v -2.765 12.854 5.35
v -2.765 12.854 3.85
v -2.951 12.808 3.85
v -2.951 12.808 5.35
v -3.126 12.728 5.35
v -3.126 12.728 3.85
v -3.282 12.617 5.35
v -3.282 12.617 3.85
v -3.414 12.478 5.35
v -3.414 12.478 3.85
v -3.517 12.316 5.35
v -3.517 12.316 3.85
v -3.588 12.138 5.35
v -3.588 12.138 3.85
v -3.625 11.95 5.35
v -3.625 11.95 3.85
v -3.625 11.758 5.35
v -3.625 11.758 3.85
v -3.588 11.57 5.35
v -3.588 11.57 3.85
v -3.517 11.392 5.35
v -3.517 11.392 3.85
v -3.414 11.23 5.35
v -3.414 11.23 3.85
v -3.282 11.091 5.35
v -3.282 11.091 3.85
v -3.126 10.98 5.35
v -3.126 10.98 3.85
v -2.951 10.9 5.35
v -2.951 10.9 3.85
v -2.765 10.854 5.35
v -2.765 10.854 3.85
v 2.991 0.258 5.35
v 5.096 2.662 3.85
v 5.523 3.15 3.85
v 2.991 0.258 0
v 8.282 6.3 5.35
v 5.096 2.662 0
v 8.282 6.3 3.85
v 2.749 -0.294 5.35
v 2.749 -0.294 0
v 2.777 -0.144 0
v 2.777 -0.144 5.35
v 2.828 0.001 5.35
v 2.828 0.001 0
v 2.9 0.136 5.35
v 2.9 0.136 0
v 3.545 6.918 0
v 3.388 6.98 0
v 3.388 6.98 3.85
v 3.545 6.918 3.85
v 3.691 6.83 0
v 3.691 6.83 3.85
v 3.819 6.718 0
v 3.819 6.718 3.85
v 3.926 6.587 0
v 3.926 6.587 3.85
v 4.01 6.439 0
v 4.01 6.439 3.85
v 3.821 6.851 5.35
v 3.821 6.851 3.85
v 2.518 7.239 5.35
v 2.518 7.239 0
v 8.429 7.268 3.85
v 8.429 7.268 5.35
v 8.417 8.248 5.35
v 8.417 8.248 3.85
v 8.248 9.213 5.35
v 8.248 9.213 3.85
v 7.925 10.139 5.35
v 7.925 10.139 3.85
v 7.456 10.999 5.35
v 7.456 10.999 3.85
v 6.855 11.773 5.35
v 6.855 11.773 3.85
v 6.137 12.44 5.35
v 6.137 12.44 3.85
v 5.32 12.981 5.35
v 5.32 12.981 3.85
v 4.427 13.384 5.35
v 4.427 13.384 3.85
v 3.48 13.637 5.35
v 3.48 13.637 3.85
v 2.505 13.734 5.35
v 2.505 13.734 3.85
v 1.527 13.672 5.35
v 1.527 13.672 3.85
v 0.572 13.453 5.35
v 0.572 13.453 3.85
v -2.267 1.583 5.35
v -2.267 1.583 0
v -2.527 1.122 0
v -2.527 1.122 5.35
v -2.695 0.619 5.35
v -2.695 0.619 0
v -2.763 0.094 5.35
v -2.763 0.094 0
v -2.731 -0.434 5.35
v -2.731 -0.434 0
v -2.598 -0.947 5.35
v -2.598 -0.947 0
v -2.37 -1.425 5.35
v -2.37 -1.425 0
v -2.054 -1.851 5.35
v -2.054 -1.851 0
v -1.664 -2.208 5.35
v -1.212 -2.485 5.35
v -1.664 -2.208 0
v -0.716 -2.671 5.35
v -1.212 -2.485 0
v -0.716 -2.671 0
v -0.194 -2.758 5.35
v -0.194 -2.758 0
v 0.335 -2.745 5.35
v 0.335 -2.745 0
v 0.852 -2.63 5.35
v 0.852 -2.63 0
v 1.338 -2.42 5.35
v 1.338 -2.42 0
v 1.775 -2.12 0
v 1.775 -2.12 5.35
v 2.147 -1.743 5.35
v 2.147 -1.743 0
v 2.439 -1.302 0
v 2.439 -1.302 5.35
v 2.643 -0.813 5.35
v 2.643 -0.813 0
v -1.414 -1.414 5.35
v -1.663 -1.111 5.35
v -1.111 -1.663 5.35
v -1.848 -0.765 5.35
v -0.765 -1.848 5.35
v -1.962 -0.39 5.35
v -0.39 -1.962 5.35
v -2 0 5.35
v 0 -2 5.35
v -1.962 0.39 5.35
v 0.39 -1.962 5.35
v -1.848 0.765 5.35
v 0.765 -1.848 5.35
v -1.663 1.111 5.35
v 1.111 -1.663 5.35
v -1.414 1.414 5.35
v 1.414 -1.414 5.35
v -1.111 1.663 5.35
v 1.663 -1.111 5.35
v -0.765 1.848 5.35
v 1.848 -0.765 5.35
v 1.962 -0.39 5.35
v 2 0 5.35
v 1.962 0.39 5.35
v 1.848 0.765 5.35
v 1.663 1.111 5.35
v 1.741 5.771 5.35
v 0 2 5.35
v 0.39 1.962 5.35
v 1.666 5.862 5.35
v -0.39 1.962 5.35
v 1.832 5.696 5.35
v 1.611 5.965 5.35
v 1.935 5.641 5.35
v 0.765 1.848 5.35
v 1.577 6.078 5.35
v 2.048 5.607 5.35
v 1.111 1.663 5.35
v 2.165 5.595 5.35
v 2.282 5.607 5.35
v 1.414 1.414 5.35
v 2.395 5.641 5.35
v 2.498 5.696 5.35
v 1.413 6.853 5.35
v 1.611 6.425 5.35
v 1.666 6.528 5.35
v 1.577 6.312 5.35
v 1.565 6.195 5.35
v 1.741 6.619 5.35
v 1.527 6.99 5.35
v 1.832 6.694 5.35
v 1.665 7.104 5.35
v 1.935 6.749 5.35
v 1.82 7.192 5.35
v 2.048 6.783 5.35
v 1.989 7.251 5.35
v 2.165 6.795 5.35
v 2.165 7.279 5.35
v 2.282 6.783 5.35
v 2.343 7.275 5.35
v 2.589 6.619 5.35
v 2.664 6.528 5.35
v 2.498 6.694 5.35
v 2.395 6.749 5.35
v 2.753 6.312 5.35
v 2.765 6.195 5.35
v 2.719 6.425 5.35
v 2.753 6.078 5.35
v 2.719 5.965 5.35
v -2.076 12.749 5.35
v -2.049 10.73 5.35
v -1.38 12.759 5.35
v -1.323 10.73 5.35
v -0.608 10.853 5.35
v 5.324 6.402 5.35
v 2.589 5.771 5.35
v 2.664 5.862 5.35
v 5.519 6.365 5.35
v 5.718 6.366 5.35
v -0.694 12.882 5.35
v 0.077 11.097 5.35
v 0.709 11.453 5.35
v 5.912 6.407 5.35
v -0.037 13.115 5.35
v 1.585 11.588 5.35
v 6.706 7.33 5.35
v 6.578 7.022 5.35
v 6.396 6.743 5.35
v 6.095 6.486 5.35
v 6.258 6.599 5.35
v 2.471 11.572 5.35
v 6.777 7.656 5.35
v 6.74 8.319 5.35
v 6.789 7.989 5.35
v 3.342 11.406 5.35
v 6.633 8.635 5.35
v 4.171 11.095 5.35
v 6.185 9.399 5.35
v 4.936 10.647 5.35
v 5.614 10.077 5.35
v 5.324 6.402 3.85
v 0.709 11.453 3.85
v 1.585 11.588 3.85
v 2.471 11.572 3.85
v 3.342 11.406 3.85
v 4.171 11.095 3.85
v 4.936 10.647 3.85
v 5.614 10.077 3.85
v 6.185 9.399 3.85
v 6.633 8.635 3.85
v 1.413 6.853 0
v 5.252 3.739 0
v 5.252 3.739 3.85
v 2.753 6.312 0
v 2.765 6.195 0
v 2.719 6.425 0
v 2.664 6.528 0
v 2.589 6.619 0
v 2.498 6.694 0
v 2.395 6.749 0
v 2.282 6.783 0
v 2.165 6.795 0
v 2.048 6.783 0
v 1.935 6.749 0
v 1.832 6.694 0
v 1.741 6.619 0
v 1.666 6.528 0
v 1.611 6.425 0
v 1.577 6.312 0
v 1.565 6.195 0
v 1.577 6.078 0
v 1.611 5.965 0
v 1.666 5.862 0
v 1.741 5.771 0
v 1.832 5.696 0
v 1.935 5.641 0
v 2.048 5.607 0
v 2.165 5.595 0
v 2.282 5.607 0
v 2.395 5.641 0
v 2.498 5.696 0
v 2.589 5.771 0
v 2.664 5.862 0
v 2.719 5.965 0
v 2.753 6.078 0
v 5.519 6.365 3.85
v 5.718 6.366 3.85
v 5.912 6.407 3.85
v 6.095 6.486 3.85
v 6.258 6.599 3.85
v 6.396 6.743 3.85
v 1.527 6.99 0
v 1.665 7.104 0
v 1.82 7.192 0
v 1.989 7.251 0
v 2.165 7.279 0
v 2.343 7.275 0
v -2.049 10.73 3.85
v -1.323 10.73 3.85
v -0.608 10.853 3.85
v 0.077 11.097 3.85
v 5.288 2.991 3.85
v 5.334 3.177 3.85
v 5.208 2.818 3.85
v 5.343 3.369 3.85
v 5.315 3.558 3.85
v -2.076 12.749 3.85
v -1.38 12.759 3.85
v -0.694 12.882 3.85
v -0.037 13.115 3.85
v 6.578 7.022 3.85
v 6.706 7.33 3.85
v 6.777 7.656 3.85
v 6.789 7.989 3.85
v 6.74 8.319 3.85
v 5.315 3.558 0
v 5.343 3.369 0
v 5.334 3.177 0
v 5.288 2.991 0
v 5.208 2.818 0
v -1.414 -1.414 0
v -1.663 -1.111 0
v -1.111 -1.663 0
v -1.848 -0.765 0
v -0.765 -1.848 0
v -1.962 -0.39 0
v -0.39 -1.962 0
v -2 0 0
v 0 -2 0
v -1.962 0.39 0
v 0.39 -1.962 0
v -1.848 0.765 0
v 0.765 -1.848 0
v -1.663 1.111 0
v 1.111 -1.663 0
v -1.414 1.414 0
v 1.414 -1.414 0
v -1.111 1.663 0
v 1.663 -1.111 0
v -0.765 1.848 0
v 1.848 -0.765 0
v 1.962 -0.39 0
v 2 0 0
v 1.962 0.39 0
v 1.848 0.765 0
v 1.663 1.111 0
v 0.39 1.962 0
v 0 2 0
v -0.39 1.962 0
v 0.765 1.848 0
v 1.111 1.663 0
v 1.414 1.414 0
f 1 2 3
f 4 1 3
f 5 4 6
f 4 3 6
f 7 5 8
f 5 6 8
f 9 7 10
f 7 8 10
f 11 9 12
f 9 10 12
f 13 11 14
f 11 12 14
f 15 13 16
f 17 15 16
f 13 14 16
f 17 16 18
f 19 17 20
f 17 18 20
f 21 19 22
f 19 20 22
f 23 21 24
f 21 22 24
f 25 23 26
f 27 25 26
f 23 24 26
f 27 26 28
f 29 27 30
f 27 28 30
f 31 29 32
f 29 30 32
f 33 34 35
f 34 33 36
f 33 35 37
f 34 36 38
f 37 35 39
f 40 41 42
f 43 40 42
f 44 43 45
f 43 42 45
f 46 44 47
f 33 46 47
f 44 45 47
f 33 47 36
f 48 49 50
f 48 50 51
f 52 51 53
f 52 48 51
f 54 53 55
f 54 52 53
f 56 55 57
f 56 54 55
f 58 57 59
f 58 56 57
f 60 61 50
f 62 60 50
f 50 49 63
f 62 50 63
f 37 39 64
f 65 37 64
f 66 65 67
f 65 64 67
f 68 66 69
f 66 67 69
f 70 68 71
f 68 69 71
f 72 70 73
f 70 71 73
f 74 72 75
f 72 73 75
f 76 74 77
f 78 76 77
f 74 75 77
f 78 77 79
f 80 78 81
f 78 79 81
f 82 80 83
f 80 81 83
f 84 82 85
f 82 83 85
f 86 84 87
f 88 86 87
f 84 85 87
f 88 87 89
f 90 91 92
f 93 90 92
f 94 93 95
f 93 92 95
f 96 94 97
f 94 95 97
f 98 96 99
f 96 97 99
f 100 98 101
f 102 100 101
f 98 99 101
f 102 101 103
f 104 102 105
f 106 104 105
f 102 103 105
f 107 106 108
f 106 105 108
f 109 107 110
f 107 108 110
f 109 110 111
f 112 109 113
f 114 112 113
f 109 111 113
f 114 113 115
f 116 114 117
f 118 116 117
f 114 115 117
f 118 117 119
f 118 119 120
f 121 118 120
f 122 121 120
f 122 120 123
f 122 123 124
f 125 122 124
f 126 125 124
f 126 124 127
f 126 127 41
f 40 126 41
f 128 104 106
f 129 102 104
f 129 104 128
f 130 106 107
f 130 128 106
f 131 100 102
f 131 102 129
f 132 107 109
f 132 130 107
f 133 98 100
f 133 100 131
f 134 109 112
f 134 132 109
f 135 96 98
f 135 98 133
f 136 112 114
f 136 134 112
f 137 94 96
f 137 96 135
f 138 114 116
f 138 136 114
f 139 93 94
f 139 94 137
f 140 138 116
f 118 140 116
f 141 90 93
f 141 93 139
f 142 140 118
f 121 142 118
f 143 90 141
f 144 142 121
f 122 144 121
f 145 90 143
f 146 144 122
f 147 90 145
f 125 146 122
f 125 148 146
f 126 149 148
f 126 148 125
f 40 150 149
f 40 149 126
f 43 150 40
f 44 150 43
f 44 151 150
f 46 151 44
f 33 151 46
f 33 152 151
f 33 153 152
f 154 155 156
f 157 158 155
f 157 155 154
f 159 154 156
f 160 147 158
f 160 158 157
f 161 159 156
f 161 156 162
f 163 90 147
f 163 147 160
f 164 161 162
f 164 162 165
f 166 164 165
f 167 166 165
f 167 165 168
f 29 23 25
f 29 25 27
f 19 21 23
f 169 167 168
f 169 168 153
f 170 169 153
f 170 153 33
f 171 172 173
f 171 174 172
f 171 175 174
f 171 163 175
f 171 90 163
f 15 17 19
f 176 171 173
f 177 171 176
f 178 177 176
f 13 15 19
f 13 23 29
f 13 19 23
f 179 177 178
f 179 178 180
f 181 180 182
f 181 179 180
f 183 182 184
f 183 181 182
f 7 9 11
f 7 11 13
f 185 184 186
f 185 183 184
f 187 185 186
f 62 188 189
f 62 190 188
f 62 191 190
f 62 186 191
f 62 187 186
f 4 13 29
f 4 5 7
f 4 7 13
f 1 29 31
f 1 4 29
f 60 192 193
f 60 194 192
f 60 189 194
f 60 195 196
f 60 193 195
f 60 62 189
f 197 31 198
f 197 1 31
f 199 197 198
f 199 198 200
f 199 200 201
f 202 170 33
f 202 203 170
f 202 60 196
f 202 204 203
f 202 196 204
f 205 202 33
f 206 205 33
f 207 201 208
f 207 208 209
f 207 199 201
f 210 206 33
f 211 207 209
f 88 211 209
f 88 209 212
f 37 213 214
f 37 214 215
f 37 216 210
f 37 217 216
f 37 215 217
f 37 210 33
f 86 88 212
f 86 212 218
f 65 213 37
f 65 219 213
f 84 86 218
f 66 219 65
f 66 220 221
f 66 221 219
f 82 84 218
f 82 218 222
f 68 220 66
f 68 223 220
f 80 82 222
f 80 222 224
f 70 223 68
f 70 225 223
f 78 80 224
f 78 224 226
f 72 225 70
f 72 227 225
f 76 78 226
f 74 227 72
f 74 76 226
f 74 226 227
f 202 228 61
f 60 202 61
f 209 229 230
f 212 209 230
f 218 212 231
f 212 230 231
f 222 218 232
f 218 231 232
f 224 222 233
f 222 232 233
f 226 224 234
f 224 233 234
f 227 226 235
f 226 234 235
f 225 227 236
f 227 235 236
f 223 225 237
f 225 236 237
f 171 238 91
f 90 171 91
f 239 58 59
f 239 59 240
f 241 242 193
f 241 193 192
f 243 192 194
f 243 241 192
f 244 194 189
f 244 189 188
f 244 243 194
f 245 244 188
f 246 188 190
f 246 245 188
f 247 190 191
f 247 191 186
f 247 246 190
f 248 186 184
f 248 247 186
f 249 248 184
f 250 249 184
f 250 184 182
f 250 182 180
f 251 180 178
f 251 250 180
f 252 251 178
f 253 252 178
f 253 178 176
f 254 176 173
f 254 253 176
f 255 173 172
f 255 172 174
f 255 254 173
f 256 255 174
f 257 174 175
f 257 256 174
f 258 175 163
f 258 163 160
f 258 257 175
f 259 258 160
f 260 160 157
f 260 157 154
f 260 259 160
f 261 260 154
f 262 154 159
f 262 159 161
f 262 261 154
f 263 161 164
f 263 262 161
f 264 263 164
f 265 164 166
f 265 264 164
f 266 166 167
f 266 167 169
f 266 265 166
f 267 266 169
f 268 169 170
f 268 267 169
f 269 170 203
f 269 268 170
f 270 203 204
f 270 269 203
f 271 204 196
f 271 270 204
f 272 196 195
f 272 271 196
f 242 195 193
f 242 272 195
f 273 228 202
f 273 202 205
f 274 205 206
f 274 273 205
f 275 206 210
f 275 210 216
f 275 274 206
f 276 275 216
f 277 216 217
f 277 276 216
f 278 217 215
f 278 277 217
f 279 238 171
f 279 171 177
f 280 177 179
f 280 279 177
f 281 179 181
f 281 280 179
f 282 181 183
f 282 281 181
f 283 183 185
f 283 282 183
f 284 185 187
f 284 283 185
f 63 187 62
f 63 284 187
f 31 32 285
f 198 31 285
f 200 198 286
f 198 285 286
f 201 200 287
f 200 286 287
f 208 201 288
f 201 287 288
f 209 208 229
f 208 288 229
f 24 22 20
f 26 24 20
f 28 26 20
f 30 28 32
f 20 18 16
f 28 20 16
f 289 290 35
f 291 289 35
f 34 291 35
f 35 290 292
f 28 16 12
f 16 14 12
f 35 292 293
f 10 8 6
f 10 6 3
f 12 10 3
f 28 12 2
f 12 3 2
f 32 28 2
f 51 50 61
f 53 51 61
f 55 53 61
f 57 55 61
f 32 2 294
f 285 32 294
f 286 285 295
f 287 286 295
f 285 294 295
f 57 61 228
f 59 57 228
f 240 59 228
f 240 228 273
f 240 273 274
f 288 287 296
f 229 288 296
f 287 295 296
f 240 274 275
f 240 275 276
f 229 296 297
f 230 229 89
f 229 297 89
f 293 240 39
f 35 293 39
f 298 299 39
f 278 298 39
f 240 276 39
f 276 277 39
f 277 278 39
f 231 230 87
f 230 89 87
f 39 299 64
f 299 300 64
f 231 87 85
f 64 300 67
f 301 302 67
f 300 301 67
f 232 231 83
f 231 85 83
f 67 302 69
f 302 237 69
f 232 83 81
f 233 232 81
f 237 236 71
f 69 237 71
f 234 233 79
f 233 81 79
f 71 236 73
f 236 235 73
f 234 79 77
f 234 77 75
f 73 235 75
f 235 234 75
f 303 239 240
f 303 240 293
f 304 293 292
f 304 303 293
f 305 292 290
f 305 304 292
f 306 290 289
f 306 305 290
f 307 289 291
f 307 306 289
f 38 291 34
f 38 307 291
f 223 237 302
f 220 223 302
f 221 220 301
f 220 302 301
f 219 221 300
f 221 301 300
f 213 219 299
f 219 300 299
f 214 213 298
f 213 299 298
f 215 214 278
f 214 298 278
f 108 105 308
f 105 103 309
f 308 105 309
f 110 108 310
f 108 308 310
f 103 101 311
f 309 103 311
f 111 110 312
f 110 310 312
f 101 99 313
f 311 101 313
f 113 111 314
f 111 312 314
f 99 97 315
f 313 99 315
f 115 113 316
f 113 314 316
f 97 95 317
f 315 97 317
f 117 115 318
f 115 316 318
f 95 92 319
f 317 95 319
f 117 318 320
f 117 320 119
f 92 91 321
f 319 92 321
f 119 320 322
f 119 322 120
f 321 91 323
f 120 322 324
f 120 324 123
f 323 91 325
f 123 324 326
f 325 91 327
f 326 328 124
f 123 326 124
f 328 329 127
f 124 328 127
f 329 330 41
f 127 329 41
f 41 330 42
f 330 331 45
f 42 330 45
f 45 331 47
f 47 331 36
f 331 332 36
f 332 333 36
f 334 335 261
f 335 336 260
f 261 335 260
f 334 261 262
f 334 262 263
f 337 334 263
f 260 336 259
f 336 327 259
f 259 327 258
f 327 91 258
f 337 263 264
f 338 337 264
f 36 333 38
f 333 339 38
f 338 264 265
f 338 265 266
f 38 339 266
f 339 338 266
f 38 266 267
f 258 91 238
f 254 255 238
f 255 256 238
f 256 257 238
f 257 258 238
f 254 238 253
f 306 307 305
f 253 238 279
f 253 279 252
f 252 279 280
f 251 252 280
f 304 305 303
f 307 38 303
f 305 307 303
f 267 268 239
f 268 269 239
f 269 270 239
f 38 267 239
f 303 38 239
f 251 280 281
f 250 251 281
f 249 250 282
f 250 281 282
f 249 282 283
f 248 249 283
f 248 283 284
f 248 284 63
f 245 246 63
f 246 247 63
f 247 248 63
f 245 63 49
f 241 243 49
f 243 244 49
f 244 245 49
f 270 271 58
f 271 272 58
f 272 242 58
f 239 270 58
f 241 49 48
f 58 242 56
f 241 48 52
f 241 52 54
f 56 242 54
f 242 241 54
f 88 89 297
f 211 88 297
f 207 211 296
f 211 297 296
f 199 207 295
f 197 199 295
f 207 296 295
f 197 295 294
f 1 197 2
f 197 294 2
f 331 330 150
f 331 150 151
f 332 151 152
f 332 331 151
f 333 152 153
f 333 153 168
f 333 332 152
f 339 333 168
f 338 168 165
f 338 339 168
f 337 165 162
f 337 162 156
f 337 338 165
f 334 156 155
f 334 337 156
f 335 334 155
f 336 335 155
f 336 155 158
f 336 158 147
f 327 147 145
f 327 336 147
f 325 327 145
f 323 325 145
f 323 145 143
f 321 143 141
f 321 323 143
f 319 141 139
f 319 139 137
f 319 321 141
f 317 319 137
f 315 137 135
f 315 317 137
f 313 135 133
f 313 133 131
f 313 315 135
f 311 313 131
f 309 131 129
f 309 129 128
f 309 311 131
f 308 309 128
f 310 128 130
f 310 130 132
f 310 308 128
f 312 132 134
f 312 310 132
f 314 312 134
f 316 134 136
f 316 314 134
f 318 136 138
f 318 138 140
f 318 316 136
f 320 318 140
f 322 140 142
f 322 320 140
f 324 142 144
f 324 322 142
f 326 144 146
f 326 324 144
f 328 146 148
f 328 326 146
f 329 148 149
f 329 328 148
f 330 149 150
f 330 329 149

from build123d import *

# Parameters (mm, degrees)
F0_R        = 2
F0_R_2      = 0.6
F1_DEPTH    = 5.35
F2_DEPTH    = 3.85
F3_T1_DEPTH = 1.5
F3_T3_DEPTH = 5.35
F3_T5_DEPTH = 8.9622341314
F3_T7_DEPTH = 4.9810546268
F3_T9_DEPTH = 5.470707469


# Not quite as in the source:
# - a fillet or chamfer that OpenCascade refuses, or shapes differently, is made with other operations: its cross-section is extruded or revolved along the edge and cut away or added


with BuildPart() as f1:
    # F0 (on Top) → F1 (new body)
    with BuildSketch(Plane.XY):
        with BuildLine():
            ThreePointArc((-2.2671417814, 1.5828117838), (-0.8296318384, -2.637600427), (2.765, 0))
            Line((2.765, 0), (5.5232667008, 3.1497960053))
            Line((5.5232667008, 3.1497960053), (3.8210715694, 6.8505014831))
            Line((3.8210715694, 6.8505014831), (1.8260751385, 7.4457344599))
            Line((1.8260751385, 7.4457344599), (-2.2671417814, 1.5828117838))
        make_face()
        Circle(F0_R, mode=Mode.SUBTRACT)
        with Locations((2.165, 6.195)):
            Circle(F0_R_2, mode=Mode.SUBTRACT)
        with BuildLine():
            Line((3.8210715694, 6.8505014831), (5.5232667008, 3.1497960053))
            Line((5.5232667008, 3.1497960053), (8.2815334016, 6.2995920106))
            ThreePointArc((8.2815334016, 6.2995920106), (6.5094775109, 12.1209007662), (0.5720401491, 13.4530626491))
            ThreePointArc((0.5720401491, 13.4530626491), (-1.0341388497, 12.8062514702), (-2.765, 12.8541613445))
            ThreePointArc((-2.765, 12.8541613445), (-3.6292192652, 11.8541613445), (-2.765, 10.8541613445))
            ThreePointArc((-2.765, 10.8541613445), (-0.9627220535, 10.7761212346), (0.7094162112, 11.4530626491))
            ThreePointArc((0.7094162112, 11.4530626491), (4.1711880344, 11.0946407177), (6.6333355769, 8.6349334352))
            ThreePointArc((6.6333355769, 8.6349334352), (6.6911609557, 7.2849011256), (5.8160680002, 6.2552685064))
            Line((5.8160680002, 6.2552685064), (3.8210715694, 6.8505014831))
        make_face()
    extrude(amount=F1_DEPTH)

    # F0 (on Top) → F2 (cut)
    with BuildSketch(Plane.XY):
        with BuildLine():
            Line((3.8210715694, 6.8505014831), (5.5232667008, 3.1497960053))
            Line((5.5232667008, 3.1497960053), (8.2815334016, 6.2995920106))
            ThreePointArc((8.2815334016, 6.2995920106), (6.5094775109, 12.1209007662), (0.5720401491, 13.4530626491))
            ThreePointArc((0.5720401491, 13.4530626491), (-1.0341388497, 12.8062514702), (-2.765, 12.8541613445))
            ThreePointArc((-2.765, 12.8541613445), (-3.6292192652, 11.8541613445), (-2.765, 10.8541613445))
            ThreePointArc((-2.765, 10.8541613445), (-0.9627220535, 10.7761212346), (0.7094162112, 11.4530626491))
            ThreePointArc((0.7094162112, 11.4530626491), (4.1711880344, 11.0946407177), (6.6333355769, 8.6349334352))
            ThreePointArc((6.6333355769, 8.6349334352), (6.6911609557, 7.2849011256), (5.8160680002, 6.2552685064))
            Line((5.8160680002, 6.2552685064), (3.8210715694, 6.8505014831))
        make_face()
    extrude(amount=F2_DEPTH, mode=Mode.SUBTRACT)

    # F3: fillet of radius 1 on 5 edges, made by hand

    # F3_s2 → F3_t1 (join)
    with BuildSketch(Plane.XY.offset(3.85)):
        with BuildLine():
            ThreePointArc((5.3238056204, 6.4021413514), (5.9123715372, 6.4072989523), (6.3960858458, 6.7426449035))
            ThreePointArc((6.3960858458, 6.7426449035), (6.1312771268, 6.4689663976), (5.8160680002, 6.2552685064))
            Line((5.8160680002, 6.2552685064), (5.3238056204, 6.4021413514))
        make_face()
    extrude(amount=F3_T1_DEPTH)

    # F3_s4 → F3_t3 (join)
    with BuildSketch(Plane.XY):
        with BuildLine():
            ThreePointArc((2.7493247705, -0.294003922), (2.8276858836, 0.0009129267), (2.9913388108, 0.258467059))
            Line((2.9913388108, 0.258467059), (2.765, 0))
            ThreePointArc((2.765, 0), (2.7610784116, -0.1472107494), (2.7493247705, -0.294003922))
        make_face()
    extrude(amount=F3_T3_DEPTH)

    # F3_s6 → F3_t5 (cut)
    with BuildSketch(Plane.XY.offset(-1.8061170657)):
        with BuildLine():
            ThreePointArc((1.41251371, 6.8533694021), (1.9030466902, 7.2251109605), (2.5183648424, 7.2391808767))
            Line((2.5183648424, 7.2391808767), (1.8260751385, 7.4457344599))
            Line((1.8260751385, 7.4457344599), (1.41251371, 6.8533694021))
        make_face()
    extrude(amount=F3_T5_DEPTH, mode=Mode.SUBTRACT)

    # F3_s8 → F3_t7 (cut)
    with BuildSketch(Plane.XY.offset(-1.1310546268)):
        with BuildLine():
            ThreePointArc((3.3875351793, 6.9798526699), (3.757108564, 6.7768067273), (4.010129337, 6.4394750953))
            Line((4.010129337, 6.4394750953), (3.8210715694, 6.8505014831))
            Line((3.8210715694, 6.8505014831), (3.3875351793, 6.9798526699))
        make_face()
    extrude(amount=F3_T7_DEPTH, mode=Mode.SUBTRACT)

    # F3_s10 → F3_t9 (cut)
    with BuildSketch(Plane.XY.offset(-1.620707469)):
        with BuildLine():
            ThreePointArc((5.2523626005, 3.738762728), (5.3335017603, 3.1773237272), (5.0961768875, 2.6620818233))
            Line((5.0961768875, 2.6620818233), (5.5232667008, 3.1497960053))
            Line((5.5232667008, 3.1497960053), (5.2523626005, 3.738762728))
        make_face()
    extrude(amount=F3_T9_DEPTH, mode=Mode.SUBTRACT)


solid = f1.part
